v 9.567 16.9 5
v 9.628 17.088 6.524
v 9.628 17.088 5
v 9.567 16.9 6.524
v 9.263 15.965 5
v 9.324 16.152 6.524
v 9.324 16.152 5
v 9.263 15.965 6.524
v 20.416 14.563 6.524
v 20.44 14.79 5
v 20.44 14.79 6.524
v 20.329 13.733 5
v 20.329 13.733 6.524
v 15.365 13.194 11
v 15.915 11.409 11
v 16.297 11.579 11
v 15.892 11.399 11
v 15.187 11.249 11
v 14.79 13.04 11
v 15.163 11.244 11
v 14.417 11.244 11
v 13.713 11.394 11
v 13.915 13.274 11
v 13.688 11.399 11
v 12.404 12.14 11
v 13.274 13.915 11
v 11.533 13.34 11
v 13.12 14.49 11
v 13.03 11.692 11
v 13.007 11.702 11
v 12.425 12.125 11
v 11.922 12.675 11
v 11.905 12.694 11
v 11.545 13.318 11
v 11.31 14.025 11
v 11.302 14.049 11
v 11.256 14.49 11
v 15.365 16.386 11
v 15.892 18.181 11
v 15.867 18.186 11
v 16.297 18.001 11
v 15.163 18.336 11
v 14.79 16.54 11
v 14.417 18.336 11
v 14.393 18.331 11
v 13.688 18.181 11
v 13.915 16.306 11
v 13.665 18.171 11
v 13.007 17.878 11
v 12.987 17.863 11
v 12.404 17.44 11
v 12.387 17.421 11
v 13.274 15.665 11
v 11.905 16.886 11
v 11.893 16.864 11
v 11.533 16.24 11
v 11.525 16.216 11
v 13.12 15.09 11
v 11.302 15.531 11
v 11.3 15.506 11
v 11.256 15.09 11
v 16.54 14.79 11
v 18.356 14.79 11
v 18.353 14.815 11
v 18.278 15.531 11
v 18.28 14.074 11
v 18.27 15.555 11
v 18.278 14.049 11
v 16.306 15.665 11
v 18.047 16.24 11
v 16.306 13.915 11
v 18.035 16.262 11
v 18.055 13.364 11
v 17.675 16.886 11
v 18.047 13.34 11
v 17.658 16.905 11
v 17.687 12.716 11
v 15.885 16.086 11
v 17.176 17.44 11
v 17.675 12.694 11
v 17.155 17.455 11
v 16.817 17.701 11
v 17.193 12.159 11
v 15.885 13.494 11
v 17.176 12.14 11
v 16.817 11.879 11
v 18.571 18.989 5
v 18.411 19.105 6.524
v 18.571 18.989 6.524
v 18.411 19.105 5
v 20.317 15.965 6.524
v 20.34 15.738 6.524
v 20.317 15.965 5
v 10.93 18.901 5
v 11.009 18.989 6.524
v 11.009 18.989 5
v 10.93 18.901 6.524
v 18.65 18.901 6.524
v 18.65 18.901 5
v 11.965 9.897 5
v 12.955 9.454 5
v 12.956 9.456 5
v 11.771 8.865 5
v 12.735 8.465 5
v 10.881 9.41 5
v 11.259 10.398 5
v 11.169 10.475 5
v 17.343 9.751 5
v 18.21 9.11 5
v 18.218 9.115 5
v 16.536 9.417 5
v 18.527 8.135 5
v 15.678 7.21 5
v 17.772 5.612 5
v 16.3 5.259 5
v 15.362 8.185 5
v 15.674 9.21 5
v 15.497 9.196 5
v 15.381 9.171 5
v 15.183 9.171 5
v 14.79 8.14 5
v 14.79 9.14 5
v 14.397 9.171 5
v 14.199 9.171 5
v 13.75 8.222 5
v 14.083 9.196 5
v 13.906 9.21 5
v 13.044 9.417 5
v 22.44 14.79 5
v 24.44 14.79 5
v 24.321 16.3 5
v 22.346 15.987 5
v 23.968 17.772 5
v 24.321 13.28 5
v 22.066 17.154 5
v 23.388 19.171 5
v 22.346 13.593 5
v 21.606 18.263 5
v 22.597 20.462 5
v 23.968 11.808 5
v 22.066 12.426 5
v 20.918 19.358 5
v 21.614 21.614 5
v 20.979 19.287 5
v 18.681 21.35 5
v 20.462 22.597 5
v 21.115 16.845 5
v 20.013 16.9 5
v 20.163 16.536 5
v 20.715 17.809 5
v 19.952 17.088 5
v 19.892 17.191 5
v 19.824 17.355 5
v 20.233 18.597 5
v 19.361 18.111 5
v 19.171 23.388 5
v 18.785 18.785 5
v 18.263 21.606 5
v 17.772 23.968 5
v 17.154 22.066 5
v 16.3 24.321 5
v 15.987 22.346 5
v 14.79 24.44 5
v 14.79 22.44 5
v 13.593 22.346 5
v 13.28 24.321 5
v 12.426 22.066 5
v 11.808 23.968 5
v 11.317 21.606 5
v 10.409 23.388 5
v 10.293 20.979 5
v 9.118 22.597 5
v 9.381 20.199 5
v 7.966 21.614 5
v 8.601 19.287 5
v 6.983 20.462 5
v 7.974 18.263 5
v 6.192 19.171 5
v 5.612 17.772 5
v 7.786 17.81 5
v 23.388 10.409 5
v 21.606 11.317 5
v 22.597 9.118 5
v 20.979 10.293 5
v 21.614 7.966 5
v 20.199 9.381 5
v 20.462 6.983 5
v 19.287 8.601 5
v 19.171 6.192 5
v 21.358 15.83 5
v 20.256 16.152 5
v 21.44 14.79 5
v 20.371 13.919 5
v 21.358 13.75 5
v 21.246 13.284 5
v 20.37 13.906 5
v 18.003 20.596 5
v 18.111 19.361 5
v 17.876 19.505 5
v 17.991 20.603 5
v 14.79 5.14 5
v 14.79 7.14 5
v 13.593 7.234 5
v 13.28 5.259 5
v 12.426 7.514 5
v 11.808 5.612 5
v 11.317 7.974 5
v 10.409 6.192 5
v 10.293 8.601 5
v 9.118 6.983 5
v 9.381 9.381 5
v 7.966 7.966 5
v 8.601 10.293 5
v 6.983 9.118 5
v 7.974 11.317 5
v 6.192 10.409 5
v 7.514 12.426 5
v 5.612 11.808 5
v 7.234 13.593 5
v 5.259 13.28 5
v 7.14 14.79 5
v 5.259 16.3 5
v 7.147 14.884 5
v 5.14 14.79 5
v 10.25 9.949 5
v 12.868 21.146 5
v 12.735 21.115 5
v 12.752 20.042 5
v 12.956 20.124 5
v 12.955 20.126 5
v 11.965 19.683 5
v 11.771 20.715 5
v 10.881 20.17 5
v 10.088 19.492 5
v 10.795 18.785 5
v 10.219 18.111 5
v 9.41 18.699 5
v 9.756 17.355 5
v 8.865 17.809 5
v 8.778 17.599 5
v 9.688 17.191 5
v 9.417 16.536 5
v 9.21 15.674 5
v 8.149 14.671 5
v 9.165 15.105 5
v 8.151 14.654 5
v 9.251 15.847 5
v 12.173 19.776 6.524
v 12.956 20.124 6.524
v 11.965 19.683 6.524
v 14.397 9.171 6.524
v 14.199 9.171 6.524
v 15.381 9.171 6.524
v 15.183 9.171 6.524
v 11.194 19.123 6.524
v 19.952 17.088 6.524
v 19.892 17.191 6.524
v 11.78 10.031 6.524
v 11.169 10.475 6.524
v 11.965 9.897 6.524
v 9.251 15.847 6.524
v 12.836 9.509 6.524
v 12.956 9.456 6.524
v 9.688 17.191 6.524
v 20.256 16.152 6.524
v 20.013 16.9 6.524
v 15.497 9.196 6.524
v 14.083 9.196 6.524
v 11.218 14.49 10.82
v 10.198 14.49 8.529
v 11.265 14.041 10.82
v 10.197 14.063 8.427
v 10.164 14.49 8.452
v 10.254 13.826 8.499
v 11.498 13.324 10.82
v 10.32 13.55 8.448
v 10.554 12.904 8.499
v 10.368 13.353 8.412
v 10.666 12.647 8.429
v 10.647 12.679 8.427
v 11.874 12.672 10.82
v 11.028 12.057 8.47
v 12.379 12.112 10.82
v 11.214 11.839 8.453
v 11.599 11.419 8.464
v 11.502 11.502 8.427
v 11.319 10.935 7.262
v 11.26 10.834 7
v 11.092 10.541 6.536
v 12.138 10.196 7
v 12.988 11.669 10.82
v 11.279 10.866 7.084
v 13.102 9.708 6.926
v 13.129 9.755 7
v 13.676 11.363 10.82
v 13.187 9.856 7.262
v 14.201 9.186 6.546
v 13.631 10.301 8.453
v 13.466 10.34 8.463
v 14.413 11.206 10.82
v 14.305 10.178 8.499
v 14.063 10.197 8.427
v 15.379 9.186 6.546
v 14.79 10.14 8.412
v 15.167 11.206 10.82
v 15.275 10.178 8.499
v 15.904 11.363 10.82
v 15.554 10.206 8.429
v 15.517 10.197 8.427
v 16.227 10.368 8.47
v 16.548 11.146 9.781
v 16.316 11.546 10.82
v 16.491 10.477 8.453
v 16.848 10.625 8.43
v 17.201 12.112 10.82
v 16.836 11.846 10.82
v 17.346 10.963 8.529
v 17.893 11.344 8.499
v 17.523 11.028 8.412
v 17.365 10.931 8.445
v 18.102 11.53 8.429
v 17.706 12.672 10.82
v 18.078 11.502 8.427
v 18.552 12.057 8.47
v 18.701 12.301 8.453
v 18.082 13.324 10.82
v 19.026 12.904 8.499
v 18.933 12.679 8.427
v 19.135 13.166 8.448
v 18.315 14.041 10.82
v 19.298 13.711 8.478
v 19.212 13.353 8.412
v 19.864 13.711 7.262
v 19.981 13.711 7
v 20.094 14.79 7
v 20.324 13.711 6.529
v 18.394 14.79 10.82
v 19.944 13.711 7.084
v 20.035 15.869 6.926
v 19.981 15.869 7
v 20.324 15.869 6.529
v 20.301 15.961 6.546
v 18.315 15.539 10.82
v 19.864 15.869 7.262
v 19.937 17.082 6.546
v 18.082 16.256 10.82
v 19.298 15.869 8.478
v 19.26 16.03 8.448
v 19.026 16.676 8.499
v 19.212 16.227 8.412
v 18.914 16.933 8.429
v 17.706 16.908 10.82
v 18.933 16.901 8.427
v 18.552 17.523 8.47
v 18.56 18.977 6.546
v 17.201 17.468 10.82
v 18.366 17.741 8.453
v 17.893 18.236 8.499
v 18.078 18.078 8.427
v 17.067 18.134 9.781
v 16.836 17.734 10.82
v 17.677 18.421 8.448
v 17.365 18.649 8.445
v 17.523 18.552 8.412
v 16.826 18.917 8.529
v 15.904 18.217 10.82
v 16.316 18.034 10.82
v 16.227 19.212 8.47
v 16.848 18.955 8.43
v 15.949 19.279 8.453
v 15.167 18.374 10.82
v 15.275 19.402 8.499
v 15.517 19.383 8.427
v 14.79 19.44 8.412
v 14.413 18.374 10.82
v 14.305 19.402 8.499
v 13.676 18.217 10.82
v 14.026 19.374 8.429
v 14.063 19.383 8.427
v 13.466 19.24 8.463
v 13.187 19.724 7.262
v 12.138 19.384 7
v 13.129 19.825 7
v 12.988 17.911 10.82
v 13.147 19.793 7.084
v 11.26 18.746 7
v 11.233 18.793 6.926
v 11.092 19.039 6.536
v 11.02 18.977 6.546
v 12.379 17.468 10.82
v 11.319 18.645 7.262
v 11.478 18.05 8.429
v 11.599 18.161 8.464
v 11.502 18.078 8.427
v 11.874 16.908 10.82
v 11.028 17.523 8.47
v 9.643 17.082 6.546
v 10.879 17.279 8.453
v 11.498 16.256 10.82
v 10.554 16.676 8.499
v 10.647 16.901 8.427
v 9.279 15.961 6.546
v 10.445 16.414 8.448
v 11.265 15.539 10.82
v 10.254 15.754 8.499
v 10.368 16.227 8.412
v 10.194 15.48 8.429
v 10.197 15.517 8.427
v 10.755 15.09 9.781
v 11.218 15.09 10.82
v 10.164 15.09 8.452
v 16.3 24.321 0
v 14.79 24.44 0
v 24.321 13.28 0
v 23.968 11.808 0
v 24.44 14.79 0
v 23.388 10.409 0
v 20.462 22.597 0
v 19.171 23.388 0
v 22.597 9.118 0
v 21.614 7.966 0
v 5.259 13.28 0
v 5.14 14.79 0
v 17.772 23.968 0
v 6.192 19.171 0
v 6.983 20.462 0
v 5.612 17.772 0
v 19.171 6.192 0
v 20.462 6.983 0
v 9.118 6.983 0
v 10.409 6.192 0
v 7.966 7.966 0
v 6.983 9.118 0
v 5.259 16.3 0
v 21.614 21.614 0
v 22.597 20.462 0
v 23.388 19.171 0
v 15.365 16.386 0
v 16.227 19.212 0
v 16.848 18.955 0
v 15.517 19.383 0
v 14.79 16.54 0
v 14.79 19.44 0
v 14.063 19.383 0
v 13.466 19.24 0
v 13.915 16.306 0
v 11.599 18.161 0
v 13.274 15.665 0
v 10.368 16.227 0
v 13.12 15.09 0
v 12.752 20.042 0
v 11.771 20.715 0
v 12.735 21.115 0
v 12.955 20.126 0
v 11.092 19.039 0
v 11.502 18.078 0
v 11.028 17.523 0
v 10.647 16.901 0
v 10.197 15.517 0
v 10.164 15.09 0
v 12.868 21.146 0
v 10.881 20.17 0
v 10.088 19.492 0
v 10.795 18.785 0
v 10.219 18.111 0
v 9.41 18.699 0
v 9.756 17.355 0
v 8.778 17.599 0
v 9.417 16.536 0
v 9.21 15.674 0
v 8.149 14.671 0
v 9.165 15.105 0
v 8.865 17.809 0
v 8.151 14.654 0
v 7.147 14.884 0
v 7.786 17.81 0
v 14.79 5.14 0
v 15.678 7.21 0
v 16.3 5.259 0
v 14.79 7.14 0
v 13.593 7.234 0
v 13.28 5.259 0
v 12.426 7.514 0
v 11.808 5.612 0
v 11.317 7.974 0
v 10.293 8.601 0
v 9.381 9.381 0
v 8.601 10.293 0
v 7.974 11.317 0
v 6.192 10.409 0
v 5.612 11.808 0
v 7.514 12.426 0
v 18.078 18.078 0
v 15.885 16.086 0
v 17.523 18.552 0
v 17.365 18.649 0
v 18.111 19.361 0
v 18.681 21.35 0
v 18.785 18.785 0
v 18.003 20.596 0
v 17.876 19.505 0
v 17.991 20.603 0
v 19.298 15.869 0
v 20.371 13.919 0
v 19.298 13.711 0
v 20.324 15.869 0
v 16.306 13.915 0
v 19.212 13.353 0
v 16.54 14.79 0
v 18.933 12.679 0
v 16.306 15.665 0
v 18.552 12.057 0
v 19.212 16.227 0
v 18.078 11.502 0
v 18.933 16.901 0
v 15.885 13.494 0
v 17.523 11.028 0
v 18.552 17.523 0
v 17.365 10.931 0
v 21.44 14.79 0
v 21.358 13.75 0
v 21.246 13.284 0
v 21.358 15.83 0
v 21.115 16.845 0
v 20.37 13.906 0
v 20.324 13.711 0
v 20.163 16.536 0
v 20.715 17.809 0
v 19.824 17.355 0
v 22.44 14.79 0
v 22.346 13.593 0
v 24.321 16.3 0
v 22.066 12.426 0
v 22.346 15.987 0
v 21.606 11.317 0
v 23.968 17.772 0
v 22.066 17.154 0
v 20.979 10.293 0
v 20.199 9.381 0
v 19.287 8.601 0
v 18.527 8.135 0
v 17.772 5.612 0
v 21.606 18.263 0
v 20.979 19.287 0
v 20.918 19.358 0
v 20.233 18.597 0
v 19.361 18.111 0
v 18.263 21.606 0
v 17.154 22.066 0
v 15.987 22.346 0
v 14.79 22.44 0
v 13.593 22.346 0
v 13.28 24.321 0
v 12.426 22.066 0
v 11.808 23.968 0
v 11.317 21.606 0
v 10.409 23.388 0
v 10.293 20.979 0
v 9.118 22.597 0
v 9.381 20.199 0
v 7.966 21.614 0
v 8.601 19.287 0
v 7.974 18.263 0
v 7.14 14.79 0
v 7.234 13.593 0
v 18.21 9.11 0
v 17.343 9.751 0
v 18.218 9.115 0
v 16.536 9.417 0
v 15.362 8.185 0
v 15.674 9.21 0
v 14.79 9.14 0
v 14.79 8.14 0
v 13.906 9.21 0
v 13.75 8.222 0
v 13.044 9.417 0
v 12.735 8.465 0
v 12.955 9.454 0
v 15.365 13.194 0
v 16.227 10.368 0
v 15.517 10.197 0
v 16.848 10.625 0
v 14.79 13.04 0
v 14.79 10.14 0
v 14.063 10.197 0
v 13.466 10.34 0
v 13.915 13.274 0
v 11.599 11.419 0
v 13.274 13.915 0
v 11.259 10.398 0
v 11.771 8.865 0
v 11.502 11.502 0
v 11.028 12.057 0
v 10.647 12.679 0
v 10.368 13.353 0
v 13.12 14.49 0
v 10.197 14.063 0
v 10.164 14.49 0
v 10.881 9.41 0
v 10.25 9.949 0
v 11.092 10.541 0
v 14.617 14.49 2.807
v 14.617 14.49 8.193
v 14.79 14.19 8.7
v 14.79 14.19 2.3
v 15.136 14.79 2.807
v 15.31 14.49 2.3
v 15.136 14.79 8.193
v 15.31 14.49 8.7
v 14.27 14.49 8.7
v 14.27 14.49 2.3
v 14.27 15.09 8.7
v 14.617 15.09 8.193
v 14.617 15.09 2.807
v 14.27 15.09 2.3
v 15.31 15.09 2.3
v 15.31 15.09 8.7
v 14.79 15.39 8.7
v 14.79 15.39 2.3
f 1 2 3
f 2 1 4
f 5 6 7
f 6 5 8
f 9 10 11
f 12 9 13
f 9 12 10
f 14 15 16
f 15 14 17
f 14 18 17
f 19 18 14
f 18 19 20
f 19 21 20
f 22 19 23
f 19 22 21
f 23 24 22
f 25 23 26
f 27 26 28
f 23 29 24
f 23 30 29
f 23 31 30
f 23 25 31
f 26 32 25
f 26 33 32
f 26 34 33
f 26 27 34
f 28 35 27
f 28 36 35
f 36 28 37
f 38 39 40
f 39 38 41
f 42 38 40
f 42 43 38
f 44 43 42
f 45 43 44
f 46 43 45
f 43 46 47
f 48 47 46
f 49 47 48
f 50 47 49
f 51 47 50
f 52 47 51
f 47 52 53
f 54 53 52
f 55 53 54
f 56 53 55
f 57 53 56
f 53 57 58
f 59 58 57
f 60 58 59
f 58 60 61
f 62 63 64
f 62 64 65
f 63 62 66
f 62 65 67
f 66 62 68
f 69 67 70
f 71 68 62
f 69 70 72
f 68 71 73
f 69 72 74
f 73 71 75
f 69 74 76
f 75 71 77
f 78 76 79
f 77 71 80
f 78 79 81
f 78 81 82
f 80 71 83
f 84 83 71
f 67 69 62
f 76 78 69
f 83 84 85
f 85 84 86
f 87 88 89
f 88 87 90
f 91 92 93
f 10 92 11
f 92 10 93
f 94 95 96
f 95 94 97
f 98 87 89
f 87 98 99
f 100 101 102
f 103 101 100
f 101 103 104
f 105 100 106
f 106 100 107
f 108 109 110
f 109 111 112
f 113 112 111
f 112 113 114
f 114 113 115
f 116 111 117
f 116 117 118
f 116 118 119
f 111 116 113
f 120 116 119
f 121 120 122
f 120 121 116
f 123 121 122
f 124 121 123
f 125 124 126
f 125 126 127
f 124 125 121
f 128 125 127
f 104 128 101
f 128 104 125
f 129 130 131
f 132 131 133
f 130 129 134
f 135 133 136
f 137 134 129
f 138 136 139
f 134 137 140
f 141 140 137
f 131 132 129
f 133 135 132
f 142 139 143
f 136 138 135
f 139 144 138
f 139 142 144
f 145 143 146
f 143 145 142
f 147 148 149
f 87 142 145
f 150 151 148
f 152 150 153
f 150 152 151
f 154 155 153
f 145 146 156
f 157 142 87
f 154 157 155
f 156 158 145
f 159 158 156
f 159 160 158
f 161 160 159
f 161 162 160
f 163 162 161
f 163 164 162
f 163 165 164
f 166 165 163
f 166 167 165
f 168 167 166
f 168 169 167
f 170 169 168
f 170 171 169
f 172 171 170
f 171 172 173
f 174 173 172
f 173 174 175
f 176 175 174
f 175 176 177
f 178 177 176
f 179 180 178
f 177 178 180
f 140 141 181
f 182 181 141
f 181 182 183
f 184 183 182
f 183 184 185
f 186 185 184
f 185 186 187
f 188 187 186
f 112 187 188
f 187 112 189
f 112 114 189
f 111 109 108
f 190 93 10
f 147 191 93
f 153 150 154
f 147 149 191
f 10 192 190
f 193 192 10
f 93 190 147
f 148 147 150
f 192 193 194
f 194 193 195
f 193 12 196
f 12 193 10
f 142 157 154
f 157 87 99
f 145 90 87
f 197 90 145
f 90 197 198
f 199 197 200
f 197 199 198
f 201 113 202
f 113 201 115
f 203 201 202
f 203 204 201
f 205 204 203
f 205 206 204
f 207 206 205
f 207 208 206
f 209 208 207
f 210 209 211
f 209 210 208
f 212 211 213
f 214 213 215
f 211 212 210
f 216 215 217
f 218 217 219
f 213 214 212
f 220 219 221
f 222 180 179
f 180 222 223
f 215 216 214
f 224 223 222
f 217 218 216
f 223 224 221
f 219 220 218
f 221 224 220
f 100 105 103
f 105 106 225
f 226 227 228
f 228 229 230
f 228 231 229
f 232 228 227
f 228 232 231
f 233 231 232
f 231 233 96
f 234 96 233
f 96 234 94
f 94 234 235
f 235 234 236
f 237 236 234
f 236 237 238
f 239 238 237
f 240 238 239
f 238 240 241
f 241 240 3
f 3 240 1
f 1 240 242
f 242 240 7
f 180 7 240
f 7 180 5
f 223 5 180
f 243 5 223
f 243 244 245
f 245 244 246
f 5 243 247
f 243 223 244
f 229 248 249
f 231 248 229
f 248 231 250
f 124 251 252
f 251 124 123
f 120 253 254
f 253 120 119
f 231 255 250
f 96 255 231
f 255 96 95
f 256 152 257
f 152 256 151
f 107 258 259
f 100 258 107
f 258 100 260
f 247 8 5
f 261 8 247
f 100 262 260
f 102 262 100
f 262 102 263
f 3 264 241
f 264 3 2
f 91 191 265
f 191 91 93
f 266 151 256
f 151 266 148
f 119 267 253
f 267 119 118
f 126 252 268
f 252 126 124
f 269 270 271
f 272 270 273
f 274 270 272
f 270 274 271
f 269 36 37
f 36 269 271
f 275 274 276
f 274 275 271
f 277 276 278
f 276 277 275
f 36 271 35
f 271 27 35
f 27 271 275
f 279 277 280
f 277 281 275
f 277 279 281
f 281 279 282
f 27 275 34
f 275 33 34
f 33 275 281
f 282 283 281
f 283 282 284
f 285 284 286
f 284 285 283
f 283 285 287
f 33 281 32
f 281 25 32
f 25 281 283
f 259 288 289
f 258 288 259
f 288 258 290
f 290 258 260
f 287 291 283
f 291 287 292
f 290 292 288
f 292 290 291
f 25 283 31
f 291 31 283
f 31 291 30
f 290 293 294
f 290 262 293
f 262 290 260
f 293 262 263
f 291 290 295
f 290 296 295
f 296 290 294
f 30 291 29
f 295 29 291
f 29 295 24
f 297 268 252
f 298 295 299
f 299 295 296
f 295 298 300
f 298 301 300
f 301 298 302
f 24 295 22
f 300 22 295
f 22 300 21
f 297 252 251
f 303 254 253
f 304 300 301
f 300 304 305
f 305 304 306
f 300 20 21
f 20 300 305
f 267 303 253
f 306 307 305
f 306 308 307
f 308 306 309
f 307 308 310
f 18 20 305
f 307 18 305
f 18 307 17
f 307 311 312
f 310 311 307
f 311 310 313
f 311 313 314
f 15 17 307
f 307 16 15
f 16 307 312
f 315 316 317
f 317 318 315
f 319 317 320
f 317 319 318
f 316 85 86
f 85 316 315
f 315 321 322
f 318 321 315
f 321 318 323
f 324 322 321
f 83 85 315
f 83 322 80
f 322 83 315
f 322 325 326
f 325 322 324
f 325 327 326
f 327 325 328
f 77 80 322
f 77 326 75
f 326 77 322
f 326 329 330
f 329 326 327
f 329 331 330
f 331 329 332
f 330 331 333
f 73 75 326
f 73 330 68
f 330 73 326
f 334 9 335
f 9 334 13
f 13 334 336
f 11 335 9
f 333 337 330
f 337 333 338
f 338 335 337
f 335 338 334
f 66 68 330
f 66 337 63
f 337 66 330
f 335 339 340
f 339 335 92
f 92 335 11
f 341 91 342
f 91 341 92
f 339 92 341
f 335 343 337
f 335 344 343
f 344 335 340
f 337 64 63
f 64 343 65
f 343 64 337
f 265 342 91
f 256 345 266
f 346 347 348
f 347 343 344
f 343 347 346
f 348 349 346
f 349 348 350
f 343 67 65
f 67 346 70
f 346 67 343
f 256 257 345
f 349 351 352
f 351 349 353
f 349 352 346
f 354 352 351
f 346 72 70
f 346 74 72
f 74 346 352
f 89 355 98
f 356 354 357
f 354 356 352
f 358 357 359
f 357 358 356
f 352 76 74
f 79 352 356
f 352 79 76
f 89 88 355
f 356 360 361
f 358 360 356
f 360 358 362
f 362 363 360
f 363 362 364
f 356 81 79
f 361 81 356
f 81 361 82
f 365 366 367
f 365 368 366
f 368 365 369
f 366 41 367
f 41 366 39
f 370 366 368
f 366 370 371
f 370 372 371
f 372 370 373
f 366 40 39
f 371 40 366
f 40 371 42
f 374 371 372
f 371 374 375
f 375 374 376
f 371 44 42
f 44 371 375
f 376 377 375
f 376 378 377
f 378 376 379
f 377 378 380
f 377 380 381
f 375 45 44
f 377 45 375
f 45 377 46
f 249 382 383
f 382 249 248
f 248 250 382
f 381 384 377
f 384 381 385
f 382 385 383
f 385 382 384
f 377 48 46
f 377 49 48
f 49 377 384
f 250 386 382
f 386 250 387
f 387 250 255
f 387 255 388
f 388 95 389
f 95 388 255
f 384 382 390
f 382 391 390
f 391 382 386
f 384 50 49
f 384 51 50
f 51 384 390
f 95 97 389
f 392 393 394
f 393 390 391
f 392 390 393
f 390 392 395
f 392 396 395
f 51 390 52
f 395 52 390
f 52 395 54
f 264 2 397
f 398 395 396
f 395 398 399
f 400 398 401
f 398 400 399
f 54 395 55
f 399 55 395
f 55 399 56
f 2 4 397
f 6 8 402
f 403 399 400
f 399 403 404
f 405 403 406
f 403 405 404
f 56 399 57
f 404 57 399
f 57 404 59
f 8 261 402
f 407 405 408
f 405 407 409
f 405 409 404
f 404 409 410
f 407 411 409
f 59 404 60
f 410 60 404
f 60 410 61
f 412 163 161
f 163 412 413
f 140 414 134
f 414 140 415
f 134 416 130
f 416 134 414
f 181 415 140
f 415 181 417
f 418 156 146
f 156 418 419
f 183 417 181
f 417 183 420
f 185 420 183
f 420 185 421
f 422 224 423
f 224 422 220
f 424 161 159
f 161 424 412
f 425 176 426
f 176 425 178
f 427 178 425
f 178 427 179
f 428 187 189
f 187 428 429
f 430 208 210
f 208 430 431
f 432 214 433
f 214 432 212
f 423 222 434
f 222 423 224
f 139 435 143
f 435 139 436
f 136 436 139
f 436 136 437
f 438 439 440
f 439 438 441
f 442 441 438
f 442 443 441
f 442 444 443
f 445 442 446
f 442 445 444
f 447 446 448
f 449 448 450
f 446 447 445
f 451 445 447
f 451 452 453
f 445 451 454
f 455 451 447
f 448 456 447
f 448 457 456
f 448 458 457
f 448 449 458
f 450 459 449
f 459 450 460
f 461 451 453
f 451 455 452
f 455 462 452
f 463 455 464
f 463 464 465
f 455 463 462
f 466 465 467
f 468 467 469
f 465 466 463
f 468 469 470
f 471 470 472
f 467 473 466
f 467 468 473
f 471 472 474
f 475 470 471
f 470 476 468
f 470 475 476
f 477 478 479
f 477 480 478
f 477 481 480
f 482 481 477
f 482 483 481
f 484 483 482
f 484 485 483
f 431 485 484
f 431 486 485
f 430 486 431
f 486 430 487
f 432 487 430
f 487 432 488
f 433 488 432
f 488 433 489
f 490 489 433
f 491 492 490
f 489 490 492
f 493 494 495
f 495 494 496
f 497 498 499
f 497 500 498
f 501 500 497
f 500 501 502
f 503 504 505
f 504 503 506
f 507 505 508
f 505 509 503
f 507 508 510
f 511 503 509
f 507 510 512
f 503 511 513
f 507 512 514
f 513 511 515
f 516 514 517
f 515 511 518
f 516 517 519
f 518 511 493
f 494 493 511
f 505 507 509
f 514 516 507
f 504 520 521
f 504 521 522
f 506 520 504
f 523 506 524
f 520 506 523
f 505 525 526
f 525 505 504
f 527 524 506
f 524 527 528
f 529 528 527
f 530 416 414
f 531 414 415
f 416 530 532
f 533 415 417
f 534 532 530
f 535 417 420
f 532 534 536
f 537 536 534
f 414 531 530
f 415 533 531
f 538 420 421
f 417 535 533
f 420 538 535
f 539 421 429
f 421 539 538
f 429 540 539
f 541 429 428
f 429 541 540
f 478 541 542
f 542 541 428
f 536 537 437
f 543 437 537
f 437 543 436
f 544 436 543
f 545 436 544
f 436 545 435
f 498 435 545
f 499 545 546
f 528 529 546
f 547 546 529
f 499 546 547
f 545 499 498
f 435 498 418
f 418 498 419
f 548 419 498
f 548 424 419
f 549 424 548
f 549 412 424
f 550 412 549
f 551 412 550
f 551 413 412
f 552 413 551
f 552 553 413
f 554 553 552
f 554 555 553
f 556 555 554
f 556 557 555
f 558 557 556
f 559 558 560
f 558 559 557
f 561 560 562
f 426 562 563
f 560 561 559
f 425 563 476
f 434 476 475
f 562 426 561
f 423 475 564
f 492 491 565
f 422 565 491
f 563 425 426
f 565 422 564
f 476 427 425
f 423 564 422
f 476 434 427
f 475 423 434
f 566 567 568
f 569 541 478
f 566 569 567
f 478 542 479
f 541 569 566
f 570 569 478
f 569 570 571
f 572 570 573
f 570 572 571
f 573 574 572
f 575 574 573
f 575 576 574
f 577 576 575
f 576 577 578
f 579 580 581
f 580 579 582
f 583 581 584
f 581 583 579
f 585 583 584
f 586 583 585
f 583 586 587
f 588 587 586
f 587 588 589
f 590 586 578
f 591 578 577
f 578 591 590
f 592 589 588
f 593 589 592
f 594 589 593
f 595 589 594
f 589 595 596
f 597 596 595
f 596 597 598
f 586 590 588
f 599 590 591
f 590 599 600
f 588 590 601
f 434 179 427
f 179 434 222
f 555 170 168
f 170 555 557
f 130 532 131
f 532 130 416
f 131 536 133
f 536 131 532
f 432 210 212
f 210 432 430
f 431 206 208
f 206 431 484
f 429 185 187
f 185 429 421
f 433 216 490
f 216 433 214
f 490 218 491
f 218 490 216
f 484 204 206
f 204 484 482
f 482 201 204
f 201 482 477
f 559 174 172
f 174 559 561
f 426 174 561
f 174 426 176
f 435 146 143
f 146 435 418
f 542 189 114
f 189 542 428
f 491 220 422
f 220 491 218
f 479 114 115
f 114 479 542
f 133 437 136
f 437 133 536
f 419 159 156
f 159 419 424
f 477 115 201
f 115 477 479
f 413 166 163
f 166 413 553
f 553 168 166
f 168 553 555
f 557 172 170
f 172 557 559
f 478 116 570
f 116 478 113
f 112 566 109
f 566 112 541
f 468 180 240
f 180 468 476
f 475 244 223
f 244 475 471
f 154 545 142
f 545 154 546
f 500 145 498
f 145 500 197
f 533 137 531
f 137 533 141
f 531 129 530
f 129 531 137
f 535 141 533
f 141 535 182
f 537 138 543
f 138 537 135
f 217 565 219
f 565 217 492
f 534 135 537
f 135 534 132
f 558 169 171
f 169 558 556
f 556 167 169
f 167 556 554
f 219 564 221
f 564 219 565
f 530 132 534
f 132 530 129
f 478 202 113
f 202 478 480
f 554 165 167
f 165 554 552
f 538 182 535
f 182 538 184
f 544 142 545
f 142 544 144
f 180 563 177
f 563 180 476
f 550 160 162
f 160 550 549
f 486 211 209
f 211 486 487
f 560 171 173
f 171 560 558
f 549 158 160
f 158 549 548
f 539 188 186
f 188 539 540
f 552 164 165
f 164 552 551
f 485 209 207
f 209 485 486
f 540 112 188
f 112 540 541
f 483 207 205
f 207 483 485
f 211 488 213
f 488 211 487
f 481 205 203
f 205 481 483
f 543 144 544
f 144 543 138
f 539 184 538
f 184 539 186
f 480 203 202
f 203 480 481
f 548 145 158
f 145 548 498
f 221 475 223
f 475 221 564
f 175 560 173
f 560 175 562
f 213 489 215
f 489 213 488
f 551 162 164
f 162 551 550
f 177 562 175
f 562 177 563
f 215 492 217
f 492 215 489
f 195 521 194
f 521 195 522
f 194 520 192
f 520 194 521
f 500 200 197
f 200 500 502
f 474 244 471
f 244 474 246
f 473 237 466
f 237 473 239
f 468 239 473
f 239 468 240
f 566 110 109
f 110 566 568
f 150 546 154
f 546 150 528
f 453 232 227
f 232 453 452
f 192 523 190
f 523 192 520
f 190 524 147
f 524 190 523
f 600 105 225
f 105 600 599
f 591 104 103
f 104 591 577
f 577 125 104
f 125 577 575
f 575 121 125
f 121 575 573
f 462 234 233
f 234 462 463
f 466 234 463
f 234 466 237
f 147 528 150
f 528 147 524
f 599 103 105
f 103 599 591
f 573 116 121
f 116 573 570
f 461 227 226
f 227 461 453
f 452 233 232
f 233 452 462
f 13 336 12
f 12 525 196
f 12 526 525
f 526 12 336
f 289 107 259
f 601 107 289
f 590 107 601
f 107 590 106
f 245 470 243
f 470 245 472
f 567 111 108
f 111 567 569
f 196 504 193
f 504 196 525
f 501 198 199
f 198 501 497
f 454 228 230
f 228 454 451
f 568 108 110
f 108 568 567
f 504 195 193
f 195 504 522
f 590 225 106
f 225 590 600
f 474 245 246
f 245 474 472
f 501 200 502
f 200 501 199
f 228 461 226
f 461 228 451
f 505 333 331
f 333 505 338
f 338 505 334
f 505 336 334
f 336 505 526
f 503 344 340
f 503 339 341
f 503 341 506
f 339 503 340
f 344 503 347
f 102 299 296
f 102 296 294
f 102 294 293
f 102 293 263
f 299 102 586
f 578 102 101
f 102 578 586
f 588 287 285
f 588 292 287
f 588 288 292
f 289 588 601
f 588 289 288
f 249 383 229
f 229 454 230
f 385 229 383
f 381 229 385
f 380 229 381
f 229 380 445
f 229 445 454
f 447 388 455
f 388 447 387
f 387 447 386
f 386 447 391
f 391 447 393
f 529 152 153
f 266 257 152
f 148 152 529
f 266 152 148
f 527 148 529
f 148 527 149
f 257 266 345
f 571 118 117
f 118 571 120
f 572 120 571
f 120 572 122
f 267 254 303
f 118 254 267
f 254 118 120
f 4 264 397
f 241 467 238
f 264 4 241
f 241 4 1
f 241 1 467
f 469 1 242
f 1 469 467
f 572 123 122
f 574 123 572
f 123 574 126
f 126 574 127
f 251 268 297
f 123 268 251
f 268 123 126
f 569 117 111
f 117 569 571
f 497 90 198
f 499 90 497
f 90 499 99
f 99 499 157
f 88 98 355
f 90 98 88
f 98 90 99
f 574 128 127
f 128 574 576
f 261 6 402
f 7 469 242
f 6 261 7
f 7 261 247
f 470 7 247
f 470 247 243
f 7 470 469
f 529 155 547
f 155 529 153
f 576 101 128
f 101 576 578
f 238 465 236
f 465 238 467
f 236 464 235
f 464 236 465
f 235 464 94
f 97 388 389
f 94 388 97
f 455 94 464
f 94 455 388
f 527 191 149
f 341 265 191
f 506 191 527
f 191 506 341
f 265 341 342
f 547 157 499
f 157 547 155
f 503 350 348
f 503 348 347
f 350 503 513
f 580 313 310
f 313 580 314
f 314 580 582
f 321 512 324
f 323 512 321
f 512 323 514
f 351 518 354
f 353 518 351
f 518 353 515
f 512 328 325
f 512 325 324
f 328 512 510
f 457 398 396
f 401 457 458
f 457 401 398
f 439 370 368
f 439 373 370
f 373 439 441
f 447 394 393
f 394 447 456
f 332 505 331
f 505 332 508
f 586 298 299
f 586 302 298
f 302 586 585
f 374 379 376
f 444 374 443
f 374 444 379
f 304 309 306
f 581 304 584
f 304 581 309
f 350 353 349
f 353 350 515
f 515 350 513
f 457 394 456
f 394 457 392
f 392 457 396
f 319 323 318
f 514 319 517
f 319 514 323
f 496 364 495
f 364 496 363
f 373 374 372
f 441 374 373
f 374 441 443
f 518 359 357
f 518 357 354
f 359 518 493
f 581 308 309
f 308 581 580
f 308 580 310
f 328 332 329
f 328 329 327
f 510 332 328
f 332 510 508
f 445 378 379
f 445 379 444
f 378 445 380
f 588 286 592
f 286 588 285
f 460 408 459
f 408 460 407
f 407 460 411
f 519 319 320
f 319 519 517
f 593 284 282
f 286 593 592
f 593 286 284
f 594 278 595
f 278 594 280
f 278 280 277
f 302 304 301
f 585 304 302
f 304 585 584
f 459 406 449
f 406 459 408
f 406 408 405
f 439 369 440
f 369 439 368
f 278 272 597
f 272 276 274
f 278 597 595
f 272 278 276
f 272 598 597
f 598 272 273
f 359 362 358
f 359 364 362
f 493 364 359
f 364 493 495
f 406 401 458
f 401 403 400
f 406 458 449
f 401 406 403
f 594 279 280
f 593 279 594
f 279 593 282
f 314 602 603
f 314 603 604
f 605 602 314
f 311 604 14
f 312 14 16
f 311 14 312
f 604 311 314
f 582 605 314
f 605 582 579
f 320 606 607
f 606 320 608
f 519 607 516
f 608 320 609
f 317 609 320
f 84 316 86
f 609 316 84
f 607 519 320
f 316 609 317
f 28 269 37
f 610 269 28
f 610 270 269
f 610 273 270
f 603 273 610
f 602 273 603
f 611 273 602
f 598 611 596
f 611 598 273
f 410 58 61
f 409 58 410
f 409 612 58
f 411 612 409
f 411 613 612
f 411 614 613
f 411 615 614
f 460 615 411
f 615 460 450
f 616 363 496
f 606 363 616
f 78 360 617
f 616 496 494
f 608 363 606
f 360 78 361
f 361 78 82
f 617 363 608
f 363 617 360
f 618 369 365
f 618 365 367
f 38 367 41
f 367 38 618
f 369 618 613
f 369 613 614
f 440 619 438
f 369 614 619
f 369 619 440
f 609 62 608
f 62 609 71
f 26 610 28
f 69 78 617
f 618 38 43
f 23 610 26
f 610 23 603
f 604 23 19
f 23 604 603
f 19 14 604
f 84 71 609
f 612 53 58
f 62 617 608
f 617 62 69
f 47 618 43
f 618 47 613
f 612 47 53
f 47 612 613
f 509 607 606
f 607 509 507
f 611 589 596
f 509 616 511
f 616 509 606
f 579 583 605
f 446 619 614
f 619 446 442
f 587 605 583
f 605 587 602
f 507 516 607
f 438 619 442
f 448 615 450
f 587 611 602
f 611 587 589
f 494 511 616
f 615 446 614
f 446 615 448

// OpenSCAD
/*
Design file for OpenSCAD
Grommet for Filament with thread and lid
*/

// Enable/disable items
grommet_enable = 0;
cap_enable = 0;
clamp_enable = 1;

// printer parameter
printer_xy_width = 0.4;
show_sep_dist = 1.0;

// blocking distance of inner and outer grommet. should be 1.0 less than real mount thickness
mount_thickness = 0.0;

// grommet parameter
grommet_diameter = 40.0;
filament_diameter = 1.75;
grommet_filament_diameter = 3*filament_diameter;
grommet_fn = 30;

// part dimensions
inner_handle_diameter = 30.0;
inner_handle_length = 6.0;
inner_thread_diameter = 16.0;
inner_thread_length = 6.0;
inner_thread_angle = 0;

outer_handle_diameter = 30.0;
outer_handle_length = 6.0;
outer_thread_diameter = 22.0;
outer_thread_length = 8.0;
outer_thread_angle = 180;

clamp_inner_length = 4.0;
clamp_cap_length = 7.0;
clamp_fn = 40;
clamp_nsegments = 3;
clamp_spring_modulus = 2.0;

cap_handle_diameter = 30.0;
cap_handle_length = 6.0;
cap_top_length = 1.6;

// thread parameter
thread_depth = 1.5;
thread_modulus = 3.0;
thread_spacing = 0.6;
thread_fn = 40;

// handle parameter
handle_depth = 1.5;
handle_modulus = 5.0;
handle_fn = 40;

// derived parameter
grommet_pos_offset = 10.0 + 0.75*mount_thickness;
clamp_cap_diameter = outer_thread_diameter - thread_depth - 2*thread_spacing;
clamp_filament_diameter = 1.0*filament_diameter;
handle_chamfer_length = 1.0*handle_depth;
thread_chamfer_length = 1.0*thread_depth;



module thread_cutout(diameter, length, depth, modulus, start_angle, clipping) {
   intersection() {

      poly = [[0.5*diameter + depth, 0.0], [0.5*diameter, 0.45*modulus], [0.5*diameter - depth, 0.0], [0.5*diameter, -0.45*modulus]];
      npoly = len(poly);
      nseg = ceil(thread_fn * (length / modulus + 1));
     
      phpoints = [
         for (iseg = [0:nseg]) 
            let (
               a = iseg / nseg * 360 * (length / modulus + 1) + start_angle,
               dxdx = cos(a), 
               dydx = sin(a)
            )
            for (ipoint = [0:npoly-1])
               let (
                  x = dxdx * poly[ipoint][0], 
                  y = dydx * poly[ipoint][0],
                  z = (iseg / nseg - 0.5) * (length + modulus) + poly[ipoint][1]
               )
               [x, y, z]
      ];
      nphpoints = (nseg + 1) * npoly;

      phfaces_1 = [[for (ip = [0 : 1 : (npoly - 1)]) ip]];
      phfaces_2 = [[for (ip = [((nseg + 1) * npoly - 1) : -1 : nseg * npoly + 0]) ip]];
      phfaces_3 = [
         for (iseg = [0:(nseg-1)])
            for (ipoint = [0:npoly-1])
               [
                  (ipoint + 0) % npoly + (iseg + 0) * npoly, 
                  (ipoint + 0) % npoly + (iseg + 1) * npoly, 
                  (ipoint + 1) % npoly + (iseg + 1) * npoly
               ]
      ];      
      phfaces_4 = [
         for (iseg = [0:(nseg-1)])
            for (ipoint = [0:npoly-1])
               [
                  (ipoint + 0) % npoly + (iseg + 0) * npoly, 
                  (ipoint + 1) % npoly + (iseg + 1) * npoly,
                  (ipoint + 1) % npoly + (iseg + 0) * npoly 
               ]
      ];      
      phfaces = concat(phfaces_1, phfaces_2, phfaces_3, phfaces_4);
      polyhedron(points = phpoints, faces = phfaces, convexity = 10);
            
      if (clipping)
         cube([2*diameter, 2*diameter, length], center = true);
   }
}
module handle_cutout(diameter, length, depth, _modulus) {
   ncutouts = ceil(3.141592654 * diameter / _modulus);
   modulus = 3.141592654 * diameter / ncutouts;
   
   for (icutout = [1:1:ncutouts]) {
      rotate([0, 0, icutout * 360 / ncutouts])
         translate([0.5*diameter, 0.0, 0.0])
            linear_extrude(height = length, center = true)
               polygon([[-depth, -0.05*modulus], [-depth, 0.05 * modulus], [0.0, 0.45*modulus], [0.0, -0.45*modulus]]);
   }
}
   

module inner_grommet() {
   intersection() {
      // grommet
      translate([0.0, 0.0, grommet_pos_offset])
         rotate_extrude(convexity = 10, $fn = grommet_fn)
            translate([0.5*(grommet_diameter + grommet_filament_diameter), 0.0, 0.0])
               rotate([0, 0, 90])
                  circle(d = grommet_diameter, $fn = grommet_fn, center = true);
      // shape
      union() {
         // inner handle
         translate([0.0, 0.0, 0.0])
            difference() {
               union() {
                  translate([0.0, 0.0, 0.5*handle_chamfer_length])
                     cylinder(d1 = inner_handle_diameter - handle_depth, d2 = inner_handle_diameter + handle_depth, h = handle_chamfer_length, $fn = handle_fn, center = true);
                  translate([0.0, 0.0, 0.5*inner_handle_length])
                     cylinder(d = inner_handle_diameter + handle_depth, h = inner_handle_length - 2*handle_chamfer_length, $fn = handle_fn, center = true);
                  translate([0.0, 0.0, inner_handle_length - 0.5*handle_chamfer_length])
                     cylinder(d1 = inner_handle_diameter + handle_depth, d2 = inner_handle_diameter - handle_depth, h = handle_chamfer_length, $fn = handle_fn, center = true);
               }
               translate([0.0, 0.0, 0.5*inner_handle_length])
                  handle_cutout(inner_handle_diameter + handle_depth, inner_handle_length, handle_depth, handle_modulus);
            }
         // inner thread
         translate([0.0, 0.0, inner_handle_length])
            difference() {
               union() {
                  translate([0.0, 0.0, 0.5*(inner_thread_length + mount_thickness)])
                     cylinder(d = inner_thread_diameter + thread_depth - thread_spacing, h = inner_thread_length + mount_thickness, $fn = thread_fn, center = true);
                  translate([0.0, 0.0, inner_thread_length + mount_thickness + 0.25*((inner_thread_diameter + thread_depth - thread_spacing))])
                     cylinder(d1 = inner_thread_diameter + thread_depth - thread_spacing, d2 = 0.0, h = 0.5*(inner_thread_diameter + thread_depth - thread_spacing), $fn = thread_fn, center = true);
               }
               translate([0.0, 0.0, 0.5*(inner_thread_length + mount_thickness + thread_depth)])
                  thread_cutout(inner_thread_diameter + thread_depth - thread_spacing, inner_thread_length + mount_thickness + thread_depth, thread_depth, thread_modulus, inner_thread_angle, false);
            }
         }
   }
}

module outer_grommet() {
   intersection() {
      // grommet
      translate([0.0, 0.0, grommet_pos_offset - mount_thickness])
         rotate_extrude(convexity = 10, $fn = grommet_fn)
            translate([0.5*(grommet_diameter + grommet_filament_diameter), 0.0, 0.0])
               rotate([0, 0, 90])
                  circle(d = grommet_diameter, $fn = grommet_fn, center = true);
      // shape
      translate([0.0, 0.0, inner_handle_length]) {
         // body, threads and handles
         difference() {
            // outer shape
            union() {
               // outer handle
               difference() {
                  // outer handle cylinders
                  union() {
                     translate([0.0, 0.0, 0.5*handle_chamfer_length])
                        cylinder(d1 = outer_handle_diameter - handle_depth, d2 = outer_handle_diameter + handle_depth, h = handle_chamfer_length, $fn = handle_fn, center = true);
                     translate([0.0, 0.0, 0.5*outer_handle_length])
                        cylinder(d = outer_handle_diameter + handle_depth, h = outer_handle_length - 2*handle_chamfer_length, $fn = handle_fn, center = true);
                     translate([0.0, 0.0, outer_handle_length - 0.5*handle_chamfer_length])
                        cylinder(d1 = outer_handle_diameter + handle_depth, d2 = outer_handle_diameter - handle_depth, h = handle_chamfer_length, $fn = handle_fn, center = true);
                  }
                  // outer handle cutout
                  translate([0.0, 0.0, 0.5*outer_handle_length])
                     handle_cutout(outer_handle_diameter + handle_depth, outer_handle_length, handle_depth, handle_modulus);
               }
               // outer thread
               translate([0.0, 0.0, outer_handle_length])
                  difference() {
                     // outer thread cylinders
                     union() {
                        translate([0.0, 0.0, 0.5 * outer_thread_length - 0.5*thread_chamfer_length])
                           cylinder(d = outer_thread_diameter + thread_depth - thread_spacing, h = outer_thread_length - thread_chamfer_length, $fn = thread_fn, center = true);
                        translate([0.0, 0.0, outer_thread_length - 0.5*thread_chamfer_length])
                           cylinder(d1 = outer_thread_diameter + thread_depth - thread_spacing, d2 = outer_thread_diameter - thread_depth - thread_spacing, h = thread_chamfer_length, $fn = thread_fn, center = true);
                     }
                     // outer thread cutout
                     translate([0.0, 0.0, 0.5*outer_thread_length])
                        thread_cutout(outer_thread_diameter + thread_depth - thread_spacing, outer_thread_length, thread_depth, thread_modulus, outer_thread_angle, false);
                  }
            } // end outer shape

            // inner thread
            translate([0.0, 0.0, 0.5*thread_chamfer_length])
               cylinder(d1 = inner_thread_diameter + thread_depth + thread_spacing, d2 = inner_thread_diameter - thread_depth + thread_spacing, h = thread_chamfer_length, $fn = thread_fn, center = true);
            translate([0.0, 0.0, 0.5*(inner_thread_length + thread_chamfer_length + 0.5*(inner_thread_diameter + thread_depth + thread_spacing))])
               cylinder(d = inner_thread_diameter - thread_depth + thread_spacing, h = inner_thread_length - thread_chamfer_length + 0.5*(inner_thread_diameter + thread_depth + thread_spacing), $fn = thread_fn, center = true);
            translate([0.0, 0.0, 0.5*(inner_thread_length + thread_depth)])
               thread_cutout(inner_thread_diameter - thread_depth + thread_spacing, inner_thread_length + thread_depth, thread_depth, thread_modulus, inner_thread_angle, false);
         }
         // fill upper part of inner thread
         translate([0.0, 0.0, inner_thread_length])
            difference() {
               translate([0.0, 0.0, 0.5*(outer_handle_length + outer_thread_length - inner_thread_length)])
                  cylinder(d = inner_thread_diameter + thread_depth + thread_spacing, h = (outer_handle_length + outer_thread_length - inner_thread_length), $fn = thread_fn, center = true);
               translate([0.0, 0.0, 0.5*thread_depth])
                  cylinder(d1 = inner_thread_diameter + thread_depth + thread_spacing, d2 = inner_thread_diameter - thread_depth + thread_spacing, h = thread_depth, $fn = thread_fn, center = true);
               translate([0.0, 0.0, 0.25*(inner_thread_diameter + thread_depth + thread_spacing)])
                  cylinder(d1 = inner_thread_diameter + thread_depth + thread_spacing, d2 = 0.0, h = 0.5*(inner_thread_diameter + thread_depth + thread_spacing), $fn = thread_fn, center = true);
            }
      }
   }
}

module clamp() {
   // shape
      // body, threads and handles
   difference() {
      union() {
         difference() {
            translate([0.0, 0.0, inner_handle_length + outer_handle_length + outer_thread_length - clamp_inner_length])
               translate([0.0, 0.0, 0.5*clamp_inner_length + 1*1.0])
                  cylinder(d = min([clamp_cap_diameter - 4*clamp_spring_modulus, inner_thread_diameter - thread_depth - thread_spacing]), h = clamp_inner_length + 2*1.0, $fn = grommet_fn, center = true);
            translate([0.0, 0.0, grommet_pos_offset - mount_thickness])
               rotate_extrude(convexity = 10, $fn = grommet_fn)
                  translate([0.5*(grommet_diameter + grommet_filament_diameter), 0.0, 0.0])
                     rotate([0, 0, 90])
                        circle(d = grommet_diameter, center = true, $fn = grommet_fn);
         }
         translate([0.0, 0.0, inner_handle_length + outer_handle_length + outer_thread_length - clamp_inner_length])
            translate([0.0, 0.0, clamp_inner_length + 0.5*clamp_cap_length + 1*1.0])
               cylinder(d = clamp_cap_diameter, h = clamp_cap_length - 2*1.0, $fn = clamp_fn, center = true);
      }

      translate([0.0, 0.0, inner_handle_length + outer_handle_length + outer_thread_length - clamp_inner_length])
         translate([0.0, 0.0, 0.25*clamp_cap_length])
            cylinder(d1 = 2 * clamp_filament_diameter, d2 = 0 * clamp_filament_diameter, h = 0.5*clamp_cap_length, $fn = 4*clamp_nsegments, center = true);

      translate([0.0, 0.0, inner_handle_length + outer_handle_length + outer_thread_length + clamp_cap_length])
         translate([0.0, 0.0, -0.25*clamp_cap_length])
            cylinder(d1 = 0 * clamp_filament_diameter, d2 = 2 * clamp_filament_diameter, h = 0.5*clamp_cap_length, $fn = 4*clamp_nsegments, center = true);


      difference() {
         cylinder(d = clamp_cap_diameter - 2*clamp_spring_modulus, h = 100.0, $fn = clamp_fn, center = true);
         cylinder(d = clamp_cap_diameter - 3*clamp_spring_modulus, h = 100.0, $fn = clamp_fn, center = true);
         for (isegment = [0:1:clamp_nsegments-1]) {
            rotate([0, 0, (isegment + 0.6) * 360 / clamp_nsegments])
               translate([0.5*clamp_cap_diameter, 0.0, 0.0])
                  cube([clamp_cap_diameter, 0.2 / clamp_nsegments * 3.141592654 * (clamp_cap_diameter - 2.5*clamp_spring_modulus), 100.0], center = true);
         }
      }      
      intersection() {
         difference() {
            cylinder(d = clamp_cap_diameter - 3*clamp_spring_modulus, h = 100.0, $fn = clamp_fn, center = true);
            cylinder(d = clamp_cap_diameter - 4*clamp_spring_modulus, h = 100.0, $fn = clamp_fn, center = true);
         }
         for (isegment = [0:1:clamp_nsegments-1]) {
            rotate([0, 0, (isegment + 0.3) * 360 / clamp_nsegments])
               translate([0.5*clamp_cap_diameter, 0.0, 0.0])
                  cube([clamp_cap_diameter, 0.4 / clamp_nsegments * 3.141592654 * (clamp_cap_diameter - 3.5*clamp_spring_modulus), 100.0], center = true);
         }
      }      
      difference() {
         cylinder(d = clamp_cap_diameter - 4*clamp_spring_modulus, h = 100.0, $fn = clamp_fn, center = true);
         cylinder(d = clamp_cap_diameter - 5*clamp_spring_modulus, h = 100.0, $fn = clamp_fn, center = true);
         for (isegment = [0:1:clamp_nsegments-1]) {
            rotate([0, 0, (isegment + 0.0) * 360 / clamp_nsegments])
               translate([0.5*clamp_cap_diameter, 0.0, 0.0])
                  cube([clamp_cap_diameter, 0.2 / clamp_nsegments * 3.141592654 * (clamp_cap_diameter - 4.5*clamp_spring_modulus), 100.0], center = true);
         }
      }

      intersection() {
         cylinder(d = clamp_cap_diameter - 4.5*clamp_spring_modulus, h = 100.0, $fn = clamp_fn, center = true);
         union() {
            for (isegment = [0:1:clamp_nsegments-1]) {
               rotate([0, 0, (isegment + 0.5) * 360 / clamp_nsegments])
                  translate([0.25*(clamp_cap_diameter - 4.5*clamp_spring_modulus), 0.0, 0.0])
                     cube([0.5*(clamp_cap_diameter - 4.5*clamp_spring_modulus), 1.5*printer_xy_width, 100.0], center = true);
            }
         }
      }
   }
}


module cap() {
   // shape
   translate([0.0, 0.0, inner_handle_length + outer_handle_length]) {
      // body, threads and handles
      difference() {
         // cap shape
         union() {
            // cap handle
            translate([0.0, 0.0, 0.5*(outer_thread_length + clamp_cap_length + cap_top_length - cap_handle_length)]) 
               cylinder(d = cap_handle_diameter - handle_depth, h = outer_thread_length + clamp_cap_length + cap_top_length - cap_handle_length, $fn = handle_fn, center = true);
            translate([0.0, 0.0, outer_thread_length + clamp_cap_length + cap_top_length - cap_handle_length]) { 
               difference() {
                  // cap handle cylinders
                  union() {
                     translate([0.0, 0.0, 0.5*handle_chamfer_length])
                        cylinder(d1 = cap_handle_diameter - handle_depth, d2 = cap_handle_diameter + handle_depth, h = handle_chamfer_length, $fn = handle_fn, center = true);
                     translate([0.0, 0.0, 0.5*cap_handle_length])
                        cylinder(d = cap_handle_diameter + handle_depth, h = cap_handle_length - 2*handle_chamfer_length, $fn = handle_fn, center = true);
                     translate([0.0, 0.0, cap_handle_length - 0.5*handle_chamfer_length])
                        cylinder(d1 = cap_handle_diameter + handle_depth, d2 = cap_handle_diameter - handle_depth, h = handle_chamfer_length, $fn = handle_fn, center = true);
                  }
                  // cap handle cutout
                  translate([0.0, 0.0, 0.5*cap_handle_length])
                     handle_cutout(cap_handle_diameter + handle_depth, cap_handle_length, handle_depth, handle_modulus);
               }
            }
         } // end cap shape

         // thread
         translate([0.0, 0.0, 0.5*thread_chamfer_length])
            cylinder(d1 = outer_thread_diameter + thread_depth + thread_spacing, d2 = outer_thread_diameter - thread_depth + thread_spacing, h = thread_chamfer_length, $fn = thread_fn, center = true);
         translate([0.0, 0.0, 0.5*(outer_thread_length + clamp_cap_length + thread_chamfer_length)])
            cylinder(d = outer_thread_diameter - thread_depth + thread_spacing, h = outer_thread_length + clamp_cap_length - thread_chamfer_length, $fn = thread_fn, center = true);
         translate([0.0, 0.0, 0.5*outer_thread_length])
           thread_cutout(outer_thread_diameter - thread_depth + thread_spacing, outer_thread_length, thread_depth, thread_modulus, outer_thread_angle, true);
      }
      // fill upper part of cap for printability
      translate([0.0, 0.0, outer_thread_length])
         difference() {
            translate([0.0, 0.0, 0.5*clamp_cap_length])
               cylinder(d = outer_thread_diameter + thread_depth + thread_spacing, h = clamp_cap_length, $fn = thread_fn, center = true);
            translate([0.0, 0.0, 0.5*thread_depth])
               cylinder(d1 = outer_thread_diameter + thread_depth + thread_spacing, d2 = outer_thread_diameter - thread_depth + thread_spacing, h = thread_depth, $fn = thread_fn, center = true);
            translate([0.0, 0.0, 0.5*(thread_depth + clamp_cap_length)])
               cylinder(d = outer_thread_diameter - thread_depth + thread_spacing, h = clamp_cap_length - thread_depth, $fn = thread_fn, center = true);
         }
   }
}

module show() {
   translate([0.0, 0.0, 0.0]) 
      difference() {
         union() {
            translate([0, 0, 0 * show_sep_dist])
               rotate([0, 0, 0 * (1*180 + 360 * show_sep_dist / thread_modulus)])
                  inner_grommet();
            translate([0, 0, mount_thickness + 1 * show_sep_dist])
               rotate([0, 0, 1*180 + 360 * (mount_thickness + 1*show_sep_dist) / thread_modulus])
                  outer_grommet();
            translate([0, 0, mount_thickness + 2 * show_sep_dist])
                  clamp();
            translate([0, 0, mount_thickness + 3 * show_sep_dist])
               rotate([0, 0, 0*180 + 360 * (mount_thickness + 3*show_sep_dist) / thread_modulus])
                  cap();
         }
         translate([-100.0/2, -100.0/2, 0.0]) 
            cube(100.0, center = true);
      }

/*
   translate([0.0, 60.0, 0.0]) 
   {
      translate([0.0, 0.0, 0.0])
         inner_grommet();
      translate([0.0, 0.0, 30.0])
         outer_grommet();
      translate([0.0, 0.0, 50.0])
         clamp();
      translate([0.0, 0.0, 80.0])
         cap();
   }         
*/
}

module print() {
   if (grommet_enable)
   {
      translate([-0.3 * (inner_handle_diameter + outer_handle_diameter), -0.3 * (inner_handle_diameter + cap_handle_diameter), 0.0])
         inner_grommet();

      translate([0.3 * (inner_handle_diameter + outer_handle_diameter), -0.3 * (outer_handle_diameter + clamp_cap_diameter), -inner_handle_length])
         outer_grommet();
   }
   if (cap_enable)
   {
      translate([-0.3 * (cap_handle_diameter + clamp_cap_diameter), 0.3 * (inner_handle_diameter + cap_handle_diameter), inner_handle_length + outer_handle_length + outer_thread_length + clamp_cap_length + cap_top_length])
         rotate([180, 0, 0])
            cap();
   }

   if (clamp_enable)
   {
      translate([0.3 * (cap_handle_diameter + clamp_cap_diameter), 0.3 * (outer_handle_diameter + clamp_cap_diameter), inner_handle_length + outer_handle_length + outer_thread_length + clamp_cap_length])
         rotate([180, 0, 0])
            clamp();
   }
}


// !show();
print();
